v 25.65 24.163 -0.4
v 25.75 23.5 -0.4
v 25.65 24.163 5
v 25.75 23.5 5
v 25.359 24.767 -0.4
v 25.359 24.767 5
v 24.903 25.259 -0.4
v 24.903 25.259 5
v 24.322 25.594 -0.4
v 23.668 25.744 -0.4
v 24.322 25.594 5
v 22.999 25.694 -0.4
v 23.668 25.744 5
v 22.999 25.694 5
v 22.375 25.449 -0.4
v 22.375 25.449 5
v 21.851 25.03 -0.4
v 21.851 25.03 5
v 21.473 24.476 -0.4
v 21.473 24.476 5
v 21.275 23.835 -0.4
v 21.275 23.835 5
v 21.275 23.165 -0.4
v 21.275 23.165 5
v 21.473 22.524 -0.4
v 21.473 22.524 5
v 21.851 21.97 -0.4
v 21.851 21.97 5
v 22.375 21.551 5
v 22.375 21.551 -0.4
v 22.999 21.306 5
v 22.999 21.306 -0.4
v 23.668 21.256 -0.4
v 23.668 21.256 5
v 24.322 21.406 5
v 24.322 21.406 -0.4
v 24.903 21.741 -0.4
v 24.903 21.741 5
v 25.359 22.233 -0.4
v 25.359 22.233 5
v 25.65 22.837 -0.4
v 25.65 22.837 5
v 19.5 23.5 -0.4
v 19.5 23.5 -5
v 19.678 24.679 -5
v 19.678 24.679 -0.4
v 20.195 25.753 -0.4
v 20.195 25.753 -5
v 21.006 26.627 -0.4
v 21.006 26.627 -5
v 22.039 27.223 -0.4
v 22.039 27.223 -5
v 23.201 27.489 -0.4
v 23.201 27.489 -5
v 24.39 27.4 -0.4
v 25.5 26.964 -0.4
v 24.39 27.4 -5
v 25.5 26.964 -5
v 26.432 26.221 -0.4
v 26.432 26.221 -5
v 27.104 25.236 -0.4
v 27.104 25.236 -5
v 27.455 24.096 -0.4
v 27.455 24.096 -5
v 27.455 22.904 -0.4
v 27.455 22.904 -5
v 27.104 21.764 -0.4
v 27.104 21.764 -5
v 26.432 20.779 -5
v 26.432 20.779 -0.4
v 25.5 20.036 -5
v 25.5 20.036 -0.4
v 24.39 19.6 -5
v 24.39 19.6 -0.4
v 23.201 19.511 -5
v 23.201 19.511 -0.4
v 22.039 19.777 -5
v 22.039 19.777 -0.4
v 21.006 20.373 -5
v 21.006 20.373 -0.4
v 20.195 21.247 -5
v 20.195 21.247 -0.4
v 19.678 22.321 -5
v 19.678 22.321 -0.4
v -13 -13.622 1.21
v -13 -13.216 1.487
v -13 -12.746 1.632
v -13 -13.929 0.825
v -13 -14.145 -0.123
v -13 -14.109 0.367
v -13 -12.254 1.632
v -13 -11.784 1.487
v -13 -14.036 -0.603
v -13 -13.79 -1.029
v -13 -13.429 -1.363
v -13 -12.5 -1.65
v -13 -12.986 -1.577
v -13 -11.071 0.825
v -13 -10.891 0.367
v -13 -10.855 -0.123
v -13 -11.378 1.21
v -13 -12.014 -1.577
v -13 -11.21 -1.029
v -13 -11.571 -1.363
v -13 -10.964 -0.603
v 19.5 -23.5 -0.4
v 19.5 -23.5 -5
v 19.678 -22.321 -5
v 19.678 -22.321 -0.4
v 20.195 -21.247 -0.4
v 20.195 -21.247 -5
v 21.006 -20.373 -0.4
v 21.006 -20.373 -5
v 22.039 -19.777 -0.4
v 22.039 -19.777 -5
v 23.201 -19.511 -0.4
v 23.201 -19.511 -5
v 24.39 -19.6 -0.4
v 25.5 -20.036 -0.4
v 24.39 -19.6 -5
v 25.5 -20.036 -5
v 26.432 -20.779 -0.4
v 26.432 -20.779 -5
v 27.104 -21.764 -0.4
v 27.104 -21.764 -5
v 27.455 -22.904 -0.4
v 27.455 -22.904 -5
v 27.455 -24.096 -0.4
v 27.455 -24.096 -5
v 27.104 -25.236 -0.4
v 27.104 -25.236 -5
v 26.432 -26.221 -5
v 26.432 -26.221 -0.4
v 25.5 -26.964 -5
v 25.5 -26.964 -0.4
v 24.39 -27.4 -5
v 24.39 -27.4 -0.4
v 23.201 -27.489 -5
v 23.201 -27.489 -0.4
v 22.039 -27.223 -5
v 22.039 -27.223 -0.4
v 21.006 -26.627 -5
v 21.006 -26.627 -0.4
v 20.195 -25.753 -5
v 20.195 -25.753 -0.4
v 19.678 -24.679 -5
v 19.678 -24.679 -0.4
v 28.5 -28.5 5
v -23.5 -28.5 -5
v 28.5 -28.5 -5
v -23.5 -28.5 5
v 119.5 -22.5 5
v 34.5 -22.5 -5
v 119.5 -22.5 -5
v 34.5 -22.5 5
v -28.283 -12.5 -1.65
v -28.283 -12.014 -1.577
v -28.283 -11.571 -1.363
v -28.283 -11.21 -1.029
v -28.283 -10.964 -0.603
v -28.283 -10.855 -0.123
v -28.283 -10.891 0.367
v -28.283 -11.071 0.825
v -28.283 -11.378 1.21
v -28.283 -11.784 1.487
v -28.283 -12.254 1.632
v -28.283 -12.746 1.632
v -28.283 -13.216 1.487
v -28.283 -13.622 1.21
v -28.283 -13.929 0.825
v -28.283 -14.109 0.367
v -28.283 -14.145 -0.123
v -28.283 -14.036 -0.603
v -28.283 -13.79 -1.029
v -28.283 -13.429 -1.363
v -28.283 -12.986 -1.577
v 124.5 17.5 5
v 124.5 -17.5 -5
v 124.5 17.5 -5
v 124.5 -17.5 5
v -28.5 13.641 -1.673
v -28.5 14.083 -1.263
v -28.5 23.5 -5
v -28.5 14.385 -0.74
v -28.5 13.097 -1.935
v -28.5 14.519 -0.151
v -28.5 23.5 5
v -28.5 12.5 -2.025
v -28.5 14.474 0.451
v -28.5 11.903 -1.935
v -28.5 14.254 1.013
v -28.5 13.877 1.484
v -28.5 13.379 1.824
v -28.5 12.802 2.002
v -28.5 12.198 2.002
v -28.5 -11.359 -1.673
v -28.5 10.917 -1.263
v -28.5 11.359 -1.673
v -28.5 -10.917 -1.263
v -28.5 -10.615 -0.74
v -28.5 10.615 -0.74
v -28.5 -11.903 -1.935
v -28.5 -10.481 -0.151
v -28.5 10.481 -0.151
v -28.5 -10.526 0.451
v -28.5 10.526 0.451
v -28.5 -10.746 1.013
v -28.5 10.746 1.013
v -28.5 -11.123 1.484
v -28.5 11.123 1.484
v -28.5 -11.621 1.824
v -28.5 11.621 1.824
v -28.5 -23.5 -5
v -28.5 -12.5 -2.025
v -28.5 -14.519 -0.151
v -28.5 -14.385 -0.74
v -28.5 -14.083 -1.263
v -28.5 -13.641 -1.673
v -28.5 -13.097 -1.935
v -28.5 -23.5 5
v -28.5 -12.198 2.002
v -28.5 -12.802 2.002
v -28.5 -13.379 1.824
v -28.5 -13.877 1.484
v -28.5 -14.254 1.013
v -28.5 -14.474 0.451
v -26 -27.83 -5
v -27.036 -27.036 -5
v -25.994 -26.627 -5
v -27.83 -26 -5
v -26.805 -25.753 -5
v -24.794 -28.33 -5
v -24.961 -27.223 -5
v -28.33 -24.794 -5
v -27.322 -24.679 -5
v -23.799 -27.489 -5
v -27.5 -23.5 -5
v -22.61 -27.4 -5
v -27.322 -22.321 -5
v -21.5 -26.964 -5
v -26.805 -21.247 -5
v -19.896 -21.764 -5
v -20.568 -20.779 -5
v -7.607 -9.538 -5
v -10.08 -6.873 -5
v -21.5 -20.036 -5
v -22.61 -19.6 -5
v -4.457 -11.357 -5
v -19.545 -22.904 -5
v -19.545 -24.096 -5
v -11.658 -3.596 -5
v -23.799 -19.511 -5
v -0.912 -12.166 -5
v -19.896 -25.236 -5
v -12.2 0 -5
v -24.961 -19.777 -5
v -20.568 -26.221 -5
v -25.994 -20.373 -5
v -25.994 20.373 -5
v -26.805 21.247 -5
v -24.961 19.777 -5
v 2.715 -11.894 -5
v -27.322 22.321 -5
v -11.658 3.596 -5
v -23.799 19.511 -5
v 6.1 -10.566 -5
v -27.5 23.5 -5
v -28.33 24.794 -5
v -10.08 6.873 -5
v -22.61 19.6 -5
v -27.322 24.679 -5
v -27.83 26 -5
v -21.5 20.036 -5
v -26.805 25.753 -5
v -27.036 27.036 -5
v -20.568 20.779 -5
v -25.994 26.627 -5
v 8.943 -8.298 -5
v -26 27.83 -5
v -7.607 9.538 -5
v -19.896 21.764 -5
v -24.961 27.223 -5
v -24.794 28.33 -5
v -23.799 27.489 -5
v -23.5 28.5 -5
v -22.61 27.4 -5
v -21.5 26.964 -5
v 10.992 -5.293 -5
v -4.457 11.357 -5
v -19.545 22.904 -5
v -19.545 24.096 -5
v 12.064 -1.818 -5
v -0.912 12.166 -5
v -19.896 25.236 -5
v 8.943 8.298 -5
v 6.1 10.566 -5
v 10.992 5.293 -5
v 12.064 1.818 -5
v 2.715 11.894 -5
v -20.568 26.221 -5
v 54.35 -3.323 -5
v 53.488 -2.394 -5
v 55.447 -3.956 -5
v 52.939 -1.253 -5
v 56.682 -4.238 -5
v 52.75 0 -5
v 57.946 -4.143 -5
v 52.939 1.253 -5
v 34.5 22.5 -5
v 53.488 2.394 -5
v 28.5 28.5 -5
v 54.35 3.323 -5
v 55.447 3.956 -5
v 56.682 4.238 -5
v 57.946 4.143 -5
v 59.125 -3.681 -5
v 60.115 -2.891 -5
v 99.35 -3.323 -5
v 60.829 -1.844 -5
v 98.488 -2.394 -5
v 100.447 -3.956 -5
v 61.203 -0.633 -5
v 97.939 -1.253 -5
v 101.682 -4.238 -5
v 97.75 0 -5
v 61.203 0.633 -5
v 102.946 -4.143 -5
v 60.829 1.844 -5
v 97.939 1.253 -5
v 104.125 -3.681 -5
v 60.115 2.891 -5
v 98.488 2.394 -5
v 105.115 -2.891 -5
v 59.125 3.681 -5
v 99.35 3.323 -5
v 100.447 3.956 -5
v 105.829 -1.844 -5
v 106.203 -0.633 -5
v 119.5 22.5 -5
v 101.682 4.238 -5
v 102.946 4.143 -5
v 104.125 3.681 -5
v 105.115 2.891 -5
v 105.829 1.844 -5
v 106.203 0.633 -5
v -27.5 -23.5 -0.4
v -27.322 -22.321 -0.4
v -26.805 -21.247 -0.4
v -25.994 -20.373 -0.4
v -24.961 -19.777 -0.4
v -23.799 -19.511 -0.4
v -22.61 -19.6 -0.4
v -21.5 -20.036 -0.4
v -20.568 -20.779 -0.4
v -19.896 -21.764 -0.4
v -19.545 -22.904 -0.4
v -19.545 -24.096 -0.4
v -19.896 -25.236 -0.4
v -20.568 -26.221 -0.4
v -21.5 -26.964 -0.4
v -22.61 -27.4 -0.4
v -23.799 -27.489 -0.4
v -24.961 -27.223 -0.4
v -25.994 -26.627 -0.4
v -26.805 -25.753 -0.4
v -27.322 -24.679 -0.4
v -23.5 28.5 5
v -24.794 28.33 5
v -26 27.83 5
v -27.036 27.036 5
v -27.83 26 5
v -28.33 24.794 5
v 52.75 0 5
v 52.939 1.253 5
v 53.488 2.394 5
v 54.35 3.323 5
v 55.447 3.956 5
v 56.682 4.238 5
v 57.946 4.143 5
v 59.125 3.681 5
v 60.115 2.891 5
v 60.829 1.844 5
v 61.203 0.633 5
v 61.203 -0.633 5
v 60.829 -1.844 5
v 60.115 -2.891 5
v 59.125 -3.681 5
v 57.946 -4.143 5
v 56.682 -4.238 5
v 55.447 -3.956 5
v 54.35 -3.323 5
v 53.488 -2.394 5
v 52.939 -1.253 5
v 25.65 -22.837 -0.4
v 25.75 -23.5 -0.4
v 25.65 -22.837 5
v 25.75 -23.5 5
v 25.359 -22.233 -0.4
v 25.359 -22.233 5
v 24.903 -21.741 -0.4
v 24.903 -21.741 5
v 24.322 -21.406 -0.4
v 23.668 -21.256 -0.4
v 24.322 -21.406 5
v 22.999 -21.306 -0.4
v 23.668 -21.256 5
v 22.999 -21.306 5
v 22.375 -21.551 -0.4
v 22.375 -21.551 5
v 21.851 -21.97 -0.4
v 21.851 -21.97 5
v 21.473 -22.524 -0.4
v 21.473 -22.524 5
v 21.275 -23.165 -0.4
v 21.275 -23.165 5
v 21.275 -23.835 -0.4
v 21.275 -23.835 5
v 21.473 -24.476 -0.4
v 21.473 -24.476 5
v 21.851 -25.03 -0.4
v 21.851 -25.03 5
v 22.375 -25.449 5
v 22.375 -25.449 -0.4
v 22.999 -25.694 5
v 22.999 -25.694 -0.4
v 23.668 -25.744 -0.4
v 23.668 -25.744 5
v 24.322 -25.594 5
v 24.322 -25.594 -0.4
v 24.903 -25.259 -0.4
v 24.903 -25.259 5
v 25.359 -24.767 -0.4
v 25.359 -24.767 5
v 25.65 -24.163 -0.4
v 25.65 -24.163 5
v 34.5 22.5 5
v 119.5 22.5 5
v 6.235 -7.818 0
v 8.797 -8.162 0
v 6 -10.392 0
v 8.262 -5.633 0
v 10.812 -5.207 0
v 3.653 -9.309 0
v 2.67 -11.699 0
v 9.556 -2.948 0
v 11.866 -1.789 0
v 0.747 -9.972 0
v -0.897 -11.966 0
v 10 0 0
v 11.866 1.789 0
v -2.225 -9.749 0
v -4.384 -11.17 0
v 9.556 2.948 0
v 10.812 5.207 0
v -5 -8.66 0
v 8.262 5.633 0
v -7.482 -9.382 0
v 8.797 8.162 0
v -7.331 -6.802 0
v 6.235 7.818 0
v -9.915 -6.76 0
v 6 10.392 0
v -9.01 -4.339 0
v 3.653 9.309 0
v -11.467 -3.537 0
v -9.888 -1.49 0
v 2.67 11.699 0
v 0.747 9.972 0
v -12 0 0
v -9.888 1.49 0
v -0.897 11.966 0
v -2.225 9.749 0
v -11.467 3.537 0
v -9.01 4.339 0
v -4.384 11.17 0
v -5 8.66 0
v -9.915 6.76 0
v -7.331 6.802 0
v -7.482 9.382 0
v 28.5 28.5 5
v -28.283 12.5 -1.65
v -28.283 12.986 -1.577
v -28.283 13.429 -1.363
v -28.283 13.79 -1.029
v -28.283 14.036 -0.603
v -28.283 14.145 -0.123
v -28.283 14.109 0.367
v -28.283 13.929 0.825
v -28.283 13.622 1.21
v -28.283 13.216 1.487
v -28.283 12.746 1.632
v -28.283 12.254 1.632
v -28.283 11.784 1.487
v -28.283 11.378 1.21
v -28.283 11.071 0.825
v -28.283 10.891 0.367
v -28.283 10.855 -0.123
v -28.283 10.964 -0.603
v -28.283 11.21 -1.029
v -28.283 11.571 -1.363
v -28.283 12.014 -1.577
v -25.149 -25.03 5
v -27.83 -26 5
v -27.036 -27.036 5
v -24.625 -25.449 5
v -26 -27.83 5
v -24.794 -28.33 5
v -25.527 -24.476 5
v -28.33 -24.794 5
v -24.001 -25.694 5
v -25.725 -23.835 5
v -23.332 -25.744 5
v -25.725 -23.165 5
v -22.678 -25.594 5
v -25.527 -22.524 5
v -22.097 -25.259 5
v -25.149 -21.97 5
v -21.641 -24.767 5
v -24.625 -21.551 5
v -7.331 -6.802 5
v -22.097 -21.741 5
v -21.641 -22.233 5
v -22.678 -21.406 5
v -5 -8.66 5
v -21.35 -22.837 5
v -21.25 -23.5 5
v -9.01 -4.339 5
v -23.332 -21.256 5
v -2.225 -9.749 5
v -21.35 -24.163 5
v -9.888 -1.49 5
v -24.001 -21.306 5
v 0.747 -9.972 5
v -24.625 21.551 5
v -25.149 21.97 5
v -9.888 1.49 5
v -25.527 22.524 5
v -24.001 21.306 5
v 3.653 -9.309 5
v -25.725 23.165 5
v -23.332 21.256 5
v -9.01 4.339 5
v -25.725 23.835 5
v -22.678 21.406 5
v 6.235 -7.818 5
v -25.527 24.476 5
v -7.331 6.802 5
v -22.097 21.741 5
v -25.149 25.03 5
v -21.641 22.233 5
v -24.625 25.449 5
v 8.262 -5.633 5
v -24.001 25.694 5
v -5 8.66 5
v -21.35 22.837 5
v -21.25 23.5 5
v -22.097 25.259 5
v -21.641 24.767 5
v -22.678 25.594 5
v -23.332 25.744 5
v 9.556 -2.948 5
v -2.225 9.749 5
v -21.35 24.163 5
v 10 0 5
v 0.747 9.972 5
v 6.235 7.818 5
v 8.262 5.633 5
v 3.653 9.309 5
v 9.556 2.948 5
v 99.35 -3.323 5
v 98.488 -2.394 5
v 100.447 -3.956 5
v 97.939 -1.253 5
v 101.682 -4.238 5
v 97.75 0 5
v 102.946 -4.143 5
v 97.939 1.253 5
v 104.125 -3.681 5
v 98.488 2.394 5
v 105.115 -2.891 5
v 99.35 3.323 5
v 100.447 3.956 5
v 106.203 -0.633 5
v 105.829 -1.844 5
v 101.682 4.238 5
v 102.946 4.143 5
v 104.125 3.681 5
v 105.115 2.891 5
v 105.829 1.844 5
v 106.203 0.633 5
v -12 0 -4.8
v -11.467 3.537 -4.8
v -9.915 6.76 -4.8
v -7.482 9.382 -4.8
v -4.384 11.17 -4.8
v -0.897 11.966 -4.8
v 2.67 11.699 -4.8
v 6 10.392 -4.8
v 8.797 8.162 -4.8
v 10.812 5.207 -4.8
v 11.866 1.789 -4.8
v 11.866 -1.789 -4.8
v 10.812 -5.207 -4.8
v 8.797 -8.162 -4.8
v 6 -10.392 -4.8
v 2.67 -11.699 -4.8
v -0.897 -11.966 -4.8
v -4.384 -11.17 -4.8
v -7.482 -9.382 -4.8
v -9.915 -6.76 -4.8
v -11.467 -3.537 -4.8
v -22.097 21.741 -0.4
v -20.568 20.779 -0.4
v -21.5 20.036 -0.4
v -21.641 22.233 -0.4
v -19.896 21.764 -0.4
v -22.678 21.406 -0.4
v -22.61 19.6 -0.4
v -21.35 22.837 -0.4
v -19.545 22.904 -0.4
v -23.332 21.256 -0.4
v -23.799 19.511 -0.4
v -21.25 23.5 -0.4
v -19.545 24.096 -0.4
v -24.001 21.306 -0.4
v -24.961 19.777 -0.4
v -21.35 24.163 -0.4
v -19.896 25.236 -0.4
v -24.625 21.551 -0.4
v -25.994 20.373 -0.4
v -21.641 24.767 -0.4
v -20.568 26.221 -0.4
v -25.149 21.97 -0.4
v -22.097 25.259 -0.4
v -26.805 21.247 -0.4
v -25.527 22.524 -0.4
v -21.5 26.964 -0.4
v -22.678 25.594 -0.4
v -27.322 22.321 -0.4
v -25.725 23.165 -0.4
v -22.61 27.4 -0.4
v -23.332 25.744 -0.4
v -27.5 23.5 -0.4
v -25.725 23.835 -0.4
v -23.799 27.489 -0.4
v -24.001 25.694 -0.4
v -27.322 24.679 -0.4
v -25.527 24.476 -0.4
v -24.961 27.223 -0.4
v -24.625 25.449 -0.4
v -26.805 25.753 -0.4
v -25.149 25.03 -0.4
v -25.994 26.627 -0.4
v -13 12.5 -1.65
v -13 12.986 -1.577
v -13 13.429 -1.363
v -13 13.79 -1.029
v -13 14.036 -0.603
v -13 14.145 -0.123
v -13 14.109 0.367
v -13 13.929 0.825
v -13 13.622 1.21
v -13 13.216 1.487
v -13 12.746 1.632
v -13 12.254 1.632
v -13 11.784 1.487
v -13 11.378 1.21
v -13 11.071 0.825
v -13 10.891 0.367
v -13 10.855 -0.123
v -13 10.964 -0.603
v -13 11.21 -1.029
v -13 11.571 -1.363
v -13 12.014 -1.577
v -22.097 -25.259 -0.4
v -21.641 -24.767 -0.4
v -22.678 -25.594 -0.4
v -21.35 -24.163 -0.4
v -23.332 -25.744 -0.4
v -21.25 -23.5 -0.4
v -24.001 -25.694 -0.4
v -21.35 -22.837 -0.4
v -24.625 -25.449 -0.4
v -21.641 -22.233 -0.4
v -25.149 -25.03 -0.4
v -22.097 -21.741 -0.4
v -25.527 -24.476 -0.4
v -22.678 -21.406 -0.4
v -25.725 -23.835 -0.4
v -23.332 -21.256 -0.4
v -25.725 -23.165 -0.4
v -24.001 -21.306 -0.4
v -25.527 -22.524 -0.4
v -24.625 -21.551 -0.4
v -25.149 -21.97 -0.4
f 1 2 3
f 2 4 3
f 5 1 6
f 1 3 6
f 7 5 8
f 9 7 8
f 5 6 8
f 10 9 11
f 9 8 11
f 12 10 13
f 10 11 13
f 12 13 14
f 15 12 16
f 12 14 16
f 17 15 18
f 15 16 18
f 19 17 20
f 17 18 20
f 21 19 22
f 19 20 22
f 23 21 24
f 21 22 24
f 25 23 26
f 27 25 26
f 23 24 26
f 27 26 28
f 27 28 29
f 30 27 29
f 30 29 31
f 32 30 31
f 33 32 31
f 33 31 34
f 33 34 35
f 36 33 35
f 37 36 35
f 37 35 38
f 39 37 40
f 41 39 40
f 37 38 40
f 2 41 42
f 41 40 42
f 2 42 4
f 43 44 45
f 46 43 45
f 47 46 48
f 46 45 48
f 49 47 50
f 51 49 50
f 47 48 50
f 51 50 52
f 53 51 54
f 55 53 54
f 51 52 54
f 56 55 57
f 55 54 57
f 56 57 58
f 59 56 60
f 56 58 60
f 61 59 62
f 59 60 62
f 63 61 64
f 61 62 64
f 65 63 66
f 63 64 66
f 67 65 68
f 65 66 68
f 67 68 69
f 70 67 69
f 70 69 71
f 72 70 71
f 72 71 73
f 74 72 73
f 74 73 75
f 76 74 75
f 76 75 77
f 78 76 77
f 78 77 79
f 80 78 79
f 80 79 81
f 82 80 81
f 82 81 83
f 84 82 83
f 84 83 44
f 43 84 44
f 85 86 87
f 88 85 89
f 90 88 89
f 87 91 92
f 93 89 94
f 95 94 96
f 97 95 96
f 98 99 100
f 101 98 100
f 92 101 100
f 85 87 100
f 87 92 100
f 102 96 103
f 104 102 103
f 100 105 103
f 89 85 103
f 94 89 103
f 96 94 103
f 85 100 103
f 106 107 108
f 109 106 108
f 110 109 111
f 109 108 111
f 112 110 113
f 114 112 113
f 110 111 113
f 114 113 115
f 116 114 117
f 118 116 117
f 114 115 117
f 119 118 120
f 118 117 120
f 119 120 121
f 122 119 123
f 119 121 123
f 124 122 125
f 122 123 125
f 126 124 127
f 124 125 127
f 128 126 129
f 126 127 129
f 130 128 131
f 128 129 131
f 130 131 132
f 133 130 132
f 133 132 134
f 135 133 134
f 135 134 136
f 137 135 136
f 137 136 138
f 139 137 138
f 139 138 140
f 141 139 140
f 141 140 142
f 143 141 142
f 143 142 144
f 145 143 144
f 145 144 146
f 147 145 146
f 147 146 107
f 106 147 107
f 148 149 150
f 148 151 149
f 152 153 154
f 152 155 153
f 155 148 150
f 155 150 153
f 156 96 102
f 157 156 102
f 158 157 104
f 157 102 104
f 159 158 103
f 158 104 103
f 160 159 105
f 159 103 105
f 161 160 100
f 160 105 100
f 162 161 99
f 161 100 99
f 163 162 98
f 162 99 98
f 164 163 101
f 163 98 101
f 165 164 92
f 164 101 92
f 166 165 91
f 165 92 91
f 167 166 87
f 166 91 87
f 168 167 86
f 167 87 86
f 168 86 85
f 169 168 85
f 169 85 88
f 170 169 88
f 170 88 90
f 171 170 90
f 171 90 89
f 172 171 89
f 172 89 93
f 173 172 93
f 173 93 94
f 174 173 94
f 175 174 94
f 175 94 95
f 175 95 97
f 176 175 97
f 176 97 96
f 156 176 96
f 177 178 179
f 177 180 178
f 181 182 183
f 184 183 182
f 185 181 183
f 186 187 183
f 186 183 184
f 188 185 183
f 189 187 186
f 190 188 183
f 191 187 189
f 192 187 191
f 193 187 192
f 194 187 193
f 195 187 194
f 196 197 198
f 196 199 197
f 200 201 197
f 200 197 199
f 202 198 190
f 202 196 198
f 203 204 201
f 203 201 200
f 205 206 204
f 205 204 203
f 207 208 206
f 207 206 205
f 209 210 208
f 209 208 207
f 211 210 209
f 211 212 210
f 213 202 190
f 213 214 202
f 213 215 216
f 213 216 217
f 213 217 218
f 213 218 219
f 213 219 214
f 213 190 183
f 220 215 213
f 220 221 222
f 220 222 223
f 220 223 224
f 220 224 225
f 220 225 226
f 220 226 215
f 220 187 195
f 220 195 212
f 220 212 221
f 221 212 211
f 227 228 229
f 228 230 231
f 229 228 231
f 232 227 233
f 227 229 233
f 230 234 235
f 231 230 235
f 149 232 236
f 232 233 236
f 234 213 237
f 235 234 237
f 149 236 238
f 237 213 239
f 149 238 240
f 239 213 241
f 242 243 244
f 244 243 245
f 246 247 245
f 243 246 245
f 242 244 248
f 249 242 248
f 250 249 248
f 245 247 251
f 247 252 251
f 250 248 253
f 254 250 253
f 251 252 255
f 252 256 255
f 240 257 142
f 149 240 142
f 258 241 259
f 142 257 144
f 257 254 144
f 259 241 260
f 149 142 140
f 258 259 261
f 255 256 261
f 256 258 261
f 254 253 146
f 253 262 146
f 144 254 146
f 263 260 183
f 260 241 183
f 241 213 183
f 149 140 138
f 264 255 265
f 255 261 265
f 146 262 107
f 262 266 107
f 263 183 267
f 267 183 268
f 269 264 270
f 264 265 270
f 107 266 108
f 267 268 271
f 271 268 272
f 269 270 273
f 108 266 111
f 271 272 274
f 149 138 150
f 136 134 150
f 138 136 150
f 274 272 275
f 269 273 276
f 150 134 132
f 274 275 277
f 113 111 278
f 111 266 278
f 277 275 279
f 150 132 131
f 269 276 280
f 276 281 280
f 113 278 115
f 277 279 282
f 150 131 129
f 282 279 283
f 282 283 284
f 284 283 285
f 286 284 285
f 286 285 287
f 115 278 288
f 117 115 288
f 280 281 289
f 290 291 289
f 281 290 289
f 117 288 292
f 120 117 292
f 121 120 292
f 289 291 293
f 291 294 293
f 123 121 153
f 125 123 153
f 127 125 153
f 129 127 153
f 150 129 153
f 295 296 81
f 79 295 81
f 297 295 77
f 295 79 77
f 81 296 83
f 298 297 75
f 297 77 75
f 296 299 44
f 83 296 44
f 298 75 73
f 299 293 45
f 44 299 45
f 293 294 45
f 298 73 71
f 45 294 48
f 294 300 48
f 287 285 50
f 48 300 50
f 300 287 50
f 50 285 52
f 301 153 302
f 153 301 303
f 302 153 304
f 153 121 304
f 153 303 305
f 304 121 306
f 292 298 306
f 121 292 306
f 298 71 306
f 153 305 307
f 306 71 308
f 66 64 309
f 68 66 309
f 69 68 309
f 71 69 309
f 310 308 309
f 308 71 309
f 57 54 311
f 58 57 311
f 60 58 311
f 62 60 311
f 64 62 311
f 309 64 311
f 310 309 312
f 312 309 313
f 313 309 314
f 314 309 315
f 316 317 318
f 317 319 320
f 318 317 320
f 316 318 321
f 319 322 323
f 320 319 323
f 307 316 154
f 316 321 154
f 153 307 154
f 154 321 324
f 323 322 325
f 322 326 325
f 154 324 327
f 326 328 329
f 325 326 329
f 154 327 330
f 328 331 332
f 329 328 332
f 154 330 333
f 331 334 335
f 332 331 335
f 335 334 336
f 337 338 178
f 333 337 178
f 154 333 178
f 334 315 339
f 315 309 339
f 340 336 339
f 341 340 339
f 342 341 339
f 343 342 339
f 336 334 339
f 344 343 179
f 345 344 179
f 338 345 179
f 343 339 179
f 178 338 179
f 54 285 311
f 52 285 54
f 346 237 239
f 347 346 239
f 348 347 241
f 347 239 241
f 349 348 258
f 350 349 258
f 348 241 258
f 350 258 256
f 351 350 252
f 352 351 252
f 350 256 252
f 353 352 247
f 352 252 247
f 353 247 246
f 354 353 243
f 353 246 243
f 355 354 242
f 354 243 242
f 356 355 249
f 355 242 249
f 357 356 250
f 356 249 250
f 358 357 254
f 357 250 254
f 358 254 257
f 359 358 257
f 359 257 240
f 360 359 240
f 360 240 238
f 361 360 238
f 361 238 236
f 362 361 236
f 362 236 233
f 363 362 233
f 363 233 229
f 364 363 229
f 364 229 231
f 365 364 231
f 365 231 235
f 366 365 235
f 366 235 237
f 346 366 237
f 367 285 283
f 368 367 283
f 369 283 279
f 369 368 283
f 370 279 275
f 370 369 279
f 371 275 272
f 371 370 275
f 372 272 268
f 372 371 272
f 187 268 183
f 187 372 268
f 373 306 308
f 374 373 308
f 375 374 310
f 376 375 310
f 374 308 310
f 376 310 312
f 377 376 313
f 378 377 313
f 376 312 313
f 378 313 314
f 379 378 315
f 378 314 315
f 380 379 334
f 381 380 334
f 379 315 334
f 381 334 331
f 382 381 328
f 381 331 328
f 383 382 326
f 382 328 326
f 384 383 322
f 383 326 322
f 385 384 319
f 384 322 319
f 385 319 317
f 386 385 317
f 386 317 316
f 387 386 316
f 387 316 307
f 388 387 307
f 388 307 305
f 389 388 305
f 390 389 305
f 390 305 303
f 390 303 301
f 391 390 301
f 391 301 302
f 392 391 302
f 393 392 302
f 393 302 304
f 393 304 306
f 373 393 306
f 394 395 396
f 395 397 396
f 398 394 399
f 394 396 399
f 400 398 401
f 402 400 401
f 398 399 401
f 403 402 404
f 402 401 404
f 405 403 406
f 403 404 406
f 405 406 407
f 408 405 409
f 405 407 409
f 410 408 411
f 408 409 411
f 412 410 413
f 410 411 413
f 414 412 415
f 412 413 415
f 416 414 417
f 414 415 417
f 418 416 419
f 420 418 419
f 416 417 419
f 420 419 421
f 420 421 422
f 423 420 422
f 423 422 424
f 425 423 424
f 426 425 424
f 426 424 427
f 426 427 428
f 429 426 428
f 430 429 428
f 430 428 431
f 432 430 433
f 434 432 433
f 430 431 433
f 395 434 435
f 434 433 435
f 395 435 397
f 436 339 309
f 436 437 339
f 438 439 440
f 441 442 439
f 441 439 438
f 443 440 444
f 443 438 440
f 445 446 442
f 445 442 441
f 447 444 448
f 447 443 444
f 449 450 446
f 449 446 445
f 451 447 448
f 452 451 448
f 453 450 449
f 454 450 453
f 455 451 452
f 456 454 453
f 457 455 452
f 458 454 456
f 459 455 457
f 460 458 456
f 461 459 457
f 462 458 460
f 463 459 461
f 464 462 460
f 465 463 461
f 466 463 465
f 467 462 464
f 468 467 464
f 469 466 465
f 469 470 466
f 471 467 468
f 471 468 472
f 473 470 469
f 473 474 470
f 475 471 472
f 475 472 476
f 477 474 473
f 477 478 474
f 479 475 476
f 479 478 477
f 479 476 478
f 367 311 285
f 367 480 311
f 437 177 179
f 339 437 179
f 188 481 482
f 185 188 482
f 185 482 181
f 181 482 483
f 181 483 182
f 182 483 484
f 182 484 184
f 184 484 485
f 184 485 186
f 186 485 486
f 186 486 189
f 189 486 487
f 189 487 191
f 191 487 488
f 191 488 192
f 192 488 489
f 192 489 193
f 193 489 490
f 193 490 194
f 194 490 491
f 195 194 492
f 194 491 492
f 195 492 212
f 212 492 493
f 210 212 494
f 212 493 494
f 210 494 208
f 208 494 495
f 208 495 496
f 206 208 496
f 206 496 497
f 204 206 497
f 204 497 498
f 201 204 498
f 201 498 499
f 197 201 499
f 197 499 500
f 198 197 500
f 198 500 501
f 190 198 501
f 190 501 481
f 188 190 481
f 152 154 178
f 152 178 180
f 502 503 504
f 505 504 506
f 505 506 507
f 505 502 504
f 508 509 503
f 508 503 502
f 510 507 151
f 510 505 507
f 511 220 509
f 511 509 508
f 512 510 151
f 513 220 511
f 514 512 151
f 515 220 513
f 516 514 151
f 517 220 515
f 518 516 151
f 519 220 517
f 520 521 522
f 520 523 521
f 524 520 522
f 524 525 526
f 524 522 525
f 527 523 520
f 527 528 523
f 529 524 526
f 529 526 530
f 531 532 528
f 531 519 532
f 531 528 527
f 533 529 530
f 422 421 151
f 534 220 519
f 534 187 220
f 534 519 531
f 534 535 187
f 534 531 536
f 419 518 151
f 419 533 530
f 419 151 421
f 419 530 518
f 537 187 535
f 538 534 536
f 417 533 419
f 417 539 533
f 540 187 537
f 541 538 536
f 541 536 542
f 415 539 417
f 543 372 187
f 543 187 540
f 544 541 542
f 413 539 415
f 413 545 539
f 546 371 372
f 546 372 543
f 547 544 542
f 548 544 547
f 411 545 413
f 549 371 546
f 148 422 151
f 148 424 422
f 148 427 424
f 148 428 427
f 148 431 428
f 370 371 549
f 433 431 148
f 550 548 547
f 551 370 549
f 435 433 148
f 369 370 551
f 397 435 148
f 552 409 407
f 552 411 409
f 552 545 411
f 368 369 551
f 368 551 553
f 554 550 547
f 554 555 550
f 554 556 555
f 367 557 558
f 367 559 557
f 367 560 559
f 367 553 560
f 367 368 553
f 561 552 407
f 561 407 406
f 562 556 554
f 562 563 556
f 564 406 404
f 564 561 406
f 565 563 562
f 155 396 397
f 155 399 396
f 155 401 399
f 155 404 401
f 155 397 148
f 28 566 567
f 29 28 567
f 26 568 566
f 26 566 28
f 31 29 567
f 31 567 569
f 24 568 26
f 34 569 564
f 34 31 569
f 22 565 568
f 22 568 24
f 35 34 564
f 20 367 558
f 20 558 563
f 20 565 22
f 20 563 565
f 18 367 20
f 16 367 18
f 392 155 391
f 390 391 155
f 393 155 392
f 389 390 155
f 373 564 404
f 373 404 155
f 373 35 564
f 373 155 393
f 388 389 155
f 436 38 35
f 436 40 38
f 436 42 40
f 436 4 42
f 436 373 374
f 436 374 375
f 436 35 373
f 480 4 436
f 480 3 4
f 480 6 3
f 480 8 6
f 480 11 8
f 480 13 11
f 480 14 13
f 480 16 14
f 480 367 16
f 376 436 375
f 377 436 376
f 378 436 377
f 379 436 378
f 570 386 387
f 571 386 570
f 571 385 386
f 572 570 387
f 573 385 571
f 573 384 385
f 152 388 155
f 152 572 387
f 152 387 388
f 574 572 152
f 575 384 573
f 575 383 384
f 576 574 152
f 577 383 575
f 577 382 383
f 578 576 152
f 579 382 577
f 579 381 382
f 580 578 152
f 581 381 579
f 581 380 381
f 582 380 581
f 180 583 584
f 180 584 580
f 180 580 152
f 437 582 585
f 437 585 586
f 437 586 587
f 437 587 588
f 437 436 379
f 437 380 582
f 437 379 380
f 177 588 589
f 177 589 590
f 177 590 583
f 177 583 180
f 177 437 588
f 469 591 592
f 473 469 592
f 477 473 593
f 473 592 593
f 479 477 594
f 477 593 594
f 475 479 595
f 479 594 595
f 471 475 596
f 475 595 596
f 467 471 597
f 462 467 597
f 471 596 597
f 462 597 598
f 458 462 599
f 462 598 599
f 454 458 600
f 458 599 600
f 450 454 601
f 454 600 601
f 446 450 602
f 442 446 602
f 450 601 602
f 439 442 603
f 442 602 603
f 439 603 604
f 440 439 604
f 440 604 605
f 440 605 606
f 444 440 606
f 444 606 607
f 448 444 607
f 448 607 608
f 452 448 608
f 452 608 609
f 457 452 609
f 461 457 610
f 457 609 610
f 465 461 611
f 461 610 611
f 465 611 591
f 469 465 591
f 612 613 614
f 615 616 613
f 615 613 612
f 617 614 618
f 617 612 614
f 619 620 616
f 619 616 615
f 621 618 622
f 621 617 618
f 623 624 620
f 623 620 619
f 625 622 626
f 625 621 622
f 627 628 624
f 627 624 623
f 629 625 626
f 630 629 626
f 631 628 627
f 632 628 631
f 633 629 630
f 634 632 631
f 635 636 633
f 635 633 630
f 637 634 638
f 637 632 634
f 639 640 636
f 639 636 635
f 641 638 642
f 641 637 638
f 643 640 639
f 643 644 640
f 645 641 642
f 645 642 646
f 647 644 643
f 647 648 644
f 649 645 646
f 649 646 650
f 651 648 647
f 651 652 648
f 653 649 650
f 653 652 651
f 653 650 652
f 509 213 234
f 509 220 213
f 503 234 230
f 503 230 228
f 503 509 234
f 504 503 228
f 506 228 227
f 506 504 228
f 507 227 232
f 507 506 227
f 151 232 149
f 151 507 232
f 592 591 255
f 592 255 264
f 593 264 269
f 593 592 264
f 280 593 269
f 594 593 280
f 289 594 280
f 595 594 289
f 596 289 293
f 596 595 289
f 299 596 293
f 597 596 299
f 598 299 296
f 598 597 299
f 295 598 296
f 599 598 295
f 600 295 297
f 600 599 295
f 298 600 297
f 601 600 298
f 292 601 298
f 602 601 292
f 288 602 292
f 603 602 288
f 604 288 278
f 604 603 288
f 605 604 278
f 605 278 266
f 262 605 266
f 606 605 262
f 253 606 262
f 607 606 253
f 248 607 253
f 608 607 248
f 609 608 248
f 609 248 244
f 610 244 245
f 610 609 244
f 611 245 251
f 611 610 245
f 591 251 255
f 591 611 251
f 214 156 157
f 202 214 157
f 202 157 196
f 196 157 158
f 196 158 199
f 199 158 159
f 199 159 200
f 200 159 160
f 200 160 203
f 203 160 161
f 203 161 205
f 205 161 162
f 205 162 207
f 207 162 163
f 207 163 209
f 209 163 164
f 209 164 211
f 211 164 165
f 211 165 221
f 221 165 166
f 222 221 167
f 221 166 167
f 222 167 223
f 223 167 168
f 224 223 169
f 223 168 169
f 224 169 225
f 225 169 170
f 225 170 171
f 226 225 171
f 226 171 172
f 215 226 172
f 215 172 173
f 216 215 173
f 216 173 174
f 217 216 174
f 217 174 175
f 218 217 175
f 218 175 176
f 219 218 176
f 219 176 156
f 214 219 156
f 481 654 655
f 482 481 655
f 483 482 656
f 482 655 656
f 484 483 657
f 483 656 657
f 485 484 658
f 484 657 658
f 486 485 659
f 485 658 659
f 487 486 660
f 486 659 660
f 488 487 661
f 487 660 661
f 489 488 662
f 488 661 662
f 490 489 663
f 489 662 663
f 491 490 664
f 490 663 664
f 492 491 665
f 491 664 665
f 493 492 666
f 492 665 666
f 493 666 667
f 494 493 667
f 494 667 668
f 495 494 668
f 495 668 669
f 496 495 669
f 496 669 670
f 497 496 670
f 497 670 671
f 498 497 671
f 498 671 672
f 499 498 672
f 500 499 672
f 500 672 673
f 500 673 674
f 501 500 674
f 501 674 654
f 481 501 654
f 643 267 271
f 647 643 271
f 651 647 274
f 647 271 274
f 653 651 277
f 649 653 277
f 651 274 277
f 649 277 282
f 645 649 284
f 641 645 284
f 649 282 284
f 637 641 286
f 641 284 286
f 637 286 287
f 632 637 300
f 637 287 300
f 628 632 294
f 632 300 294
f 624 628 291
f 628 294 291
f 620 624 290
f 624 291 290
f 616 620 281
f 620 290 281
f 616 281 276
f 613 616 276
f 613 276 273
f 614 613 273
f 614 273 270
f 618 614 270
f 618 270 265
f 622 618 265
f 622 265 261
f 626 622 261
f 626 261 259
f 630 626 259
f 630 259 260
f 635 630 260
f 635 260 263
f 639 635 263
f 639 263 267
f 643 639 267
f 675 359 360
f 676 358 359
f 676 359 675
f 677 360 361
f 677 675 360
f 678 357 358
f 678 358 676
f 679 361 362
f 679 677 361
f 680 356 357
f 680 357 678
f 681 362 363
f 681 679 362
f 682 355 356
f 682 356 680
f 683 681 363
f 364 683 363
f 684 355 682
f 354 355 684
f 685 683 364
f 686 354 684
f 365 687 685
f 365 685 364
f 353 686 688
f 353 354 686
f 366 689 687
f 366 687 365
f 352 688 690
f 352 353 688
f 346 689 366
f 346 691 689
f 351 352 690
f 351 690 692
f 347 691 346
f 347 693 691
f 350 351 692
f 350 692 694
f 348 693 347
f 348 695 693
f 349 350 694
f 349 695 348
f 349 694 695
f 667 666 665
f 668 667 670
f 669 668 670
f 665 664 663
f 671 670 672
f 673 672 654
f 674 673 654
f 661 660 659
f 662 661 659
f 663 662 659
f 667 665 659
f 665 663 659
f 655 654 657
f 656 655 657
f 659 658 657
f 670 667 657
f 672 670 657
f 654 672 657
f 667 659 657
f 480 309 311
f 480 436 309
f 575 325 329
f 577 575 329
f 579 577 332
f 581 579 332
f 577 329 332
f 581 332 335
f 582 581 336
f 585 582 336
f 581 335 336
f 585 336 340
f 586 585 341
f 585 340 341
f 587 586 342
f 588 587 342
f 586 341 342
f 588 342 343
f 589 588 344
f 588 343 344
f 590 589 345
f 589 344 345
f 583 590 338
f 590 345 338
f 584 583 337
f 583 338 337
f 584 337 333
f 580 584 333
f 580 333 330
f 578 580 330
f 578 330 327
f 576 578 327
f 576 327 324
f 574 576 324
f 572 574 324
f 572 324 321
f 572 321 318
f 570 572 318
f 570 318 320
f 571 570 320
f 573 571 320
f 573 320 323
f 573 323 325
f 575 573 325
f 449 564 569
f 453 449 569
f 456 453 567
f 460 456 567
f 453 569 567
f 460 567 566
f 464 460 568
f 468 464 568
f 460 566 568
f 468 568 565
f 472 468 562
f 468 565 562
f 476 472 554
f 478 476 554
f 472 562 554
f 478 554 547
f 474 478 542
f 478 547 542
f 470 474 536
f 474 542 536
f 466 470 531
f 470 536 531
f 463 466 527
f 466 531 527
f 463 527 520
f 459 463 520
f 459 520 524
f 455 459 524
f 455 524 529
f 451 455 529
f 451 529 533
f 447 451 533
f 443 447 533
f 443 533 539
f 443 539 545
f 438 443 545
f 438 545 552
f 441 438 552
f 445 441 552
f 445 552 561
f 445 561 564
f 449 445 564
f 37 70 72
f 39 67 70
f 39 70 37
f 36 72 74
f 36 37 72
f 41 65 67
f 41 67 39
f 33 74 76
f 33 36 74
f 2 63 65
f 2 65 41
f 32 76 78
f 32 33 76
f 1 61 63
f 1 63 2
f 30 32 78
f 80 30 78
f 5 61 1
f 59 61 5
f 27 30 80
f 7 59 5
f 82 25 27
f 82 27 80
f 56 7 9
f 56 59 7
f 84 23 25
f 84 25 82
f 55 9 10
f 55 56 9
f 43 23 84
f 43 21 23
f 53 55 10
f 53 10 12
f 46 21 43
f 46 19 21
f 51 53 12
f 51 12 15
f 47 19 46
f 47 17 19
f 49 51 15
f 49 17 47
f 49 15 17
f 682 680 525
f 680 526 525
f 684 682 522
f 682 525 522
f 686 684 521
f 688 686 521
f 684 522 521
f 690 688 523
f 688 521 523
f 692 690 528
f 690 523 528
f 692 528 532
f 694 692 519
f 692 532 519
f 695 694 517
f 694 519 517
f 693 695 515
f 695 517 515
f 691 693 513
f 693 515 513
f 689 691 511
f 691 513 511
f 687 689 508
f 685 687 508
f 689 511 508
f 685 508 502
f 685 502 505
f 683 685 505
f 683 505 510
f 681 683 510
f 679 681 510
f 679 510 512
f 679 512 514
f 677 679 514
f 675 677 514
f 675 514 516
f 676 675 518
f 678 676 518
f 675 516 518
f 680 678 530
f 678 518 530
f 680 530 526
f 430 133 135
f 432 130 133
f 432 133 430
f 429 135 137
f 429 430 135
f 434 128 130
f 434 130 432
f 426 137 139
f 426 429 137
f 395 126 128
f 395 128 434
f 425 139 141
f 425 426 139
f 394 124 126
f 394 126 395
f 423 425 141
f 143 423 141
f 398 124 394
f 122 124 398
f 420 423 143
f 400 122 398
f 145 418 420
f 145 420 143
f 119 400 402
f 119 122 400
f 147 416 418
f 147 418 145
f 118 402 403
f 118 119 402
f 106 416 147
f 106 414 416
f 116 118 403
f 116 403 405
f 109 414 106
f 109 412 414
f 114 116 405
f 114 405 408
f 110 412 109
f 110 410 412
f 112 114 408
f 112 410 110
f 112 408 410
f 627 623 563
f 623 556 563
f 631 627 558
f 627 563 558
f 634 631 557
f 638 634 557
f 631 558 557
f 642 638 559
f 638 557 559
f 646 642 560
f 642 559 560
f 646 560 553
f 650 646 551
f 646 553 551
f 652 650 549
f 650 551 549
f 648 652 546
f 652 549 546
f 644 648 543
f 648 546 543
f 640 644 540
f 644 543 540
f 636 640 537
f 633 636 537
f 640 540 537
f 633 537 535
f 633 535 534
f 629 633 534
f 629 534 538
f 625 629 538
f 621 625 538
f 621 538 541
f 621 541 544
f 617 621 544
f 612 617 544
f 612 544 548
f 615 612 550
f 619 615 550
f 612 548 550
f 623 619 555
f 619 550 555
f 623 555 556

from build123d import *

# Parameters (mm, degrees)
EXTRUDE_1_DEPTH              = 5
SKETCH_6_R                   = 10
CUT_EXTRUDE_1513_DEPTH       = 10
SKETCH_19_R                  = 12
CUT_EXTRUDE_1929_DEPTH       = 5
HOLE_WIZARD_8_5_8_5_1_D      = 8.5
HOLE_WIZARD_1_D              = 4.5
HOLE_WIZARD_1_CBORE_D        = 8
HOLE_WIZARD_1_CBORE_DEPTH    = 4.6
FILLET_1_R                   = 5
CHAMFER_1_SIZE               = 5
CHAMFER_2_SIZE               = 0.2
HOLE_WIZARD_M4_1_D           = 3.3
HOLE_WIZARD_M4_1_DEPTH       = 15.5
HOLE_WIZARD_M4_1_CSINK_D     = 4.05
HOLE_WIZARD_M4_1_CSINK_ANGLE = 120


with BuildPart() as part:
    # 草图1 → 凸台-拉伸1 (new body, symmetric)
    with BuildSketch(Plane.XY):
        Polygon((28.5, 28.5), (-28.5, 28.5), (-28.5, -28.5), (28.5, -28.5), (34.5, -22.5), (124.5, -22.5), (124.5, 22.5), (34.5, 22.5), align=None)
    extrude(amount=EXTRUDE_1_DEPTH, both=True)

    # 草图6 → Cut-Extrude 1513 (cut)
    with BuildSketch(Plane.XY.offset(5)):
        Circle(SKETCH_6_R)
    extrude(amount=-CUT_EXTRUDE_1513_DEPTH, mode=Mode.SUBTRACT)

    # 草图19 → Cut-Extrude 1929 (cut)
    with BuildSketch(Plane(origin=(0, 0, -5), x_dir=(-1, 0, 0), z_dir=(0, 0, -1))):
        Circle(SKETCH_19_R)
    extrude(amount=-CUT_EXTRUDE_1929_DEPTH, mode=Mode.SUBTRACT)

    # Ø8.5 (8.5) 直径孔1 (through all)
    with Locations(Plane.XY.offset(5)):
        with Locations((57, 0), (102, 0)):
            Hole(HOLE_WIZARD_8_5_8_5_1_D / 2)

    # 打孔尺寸(%根据)内六角圆柱头螺钉的类型1 (through all)
    with Locations(Plane(origin=(0, 0, -5), x_dir=(-1, 0, 0), z_dir=(0, 0, -1))):
        with Locations((-23.5, 23.5), (23.5, 23.5), (23.5, -23.5), (-23.5, -23.5)):
            CounterBoreHole(HOLE_WIZARD_1_D / 2, HOLE_WIZARD_1_CBORE_D / 2, HOLE_WIZARD_1_CBORE_DEPTH)

    # 圆角1
    fillet_1_edges = [part.edges().sort_by_distance(p)[0] for p in [
        (-28.5, -28.5, 0),
        (-28.5, 28.5, 0),
    ]]
    fillet(fillet_1_edges, radius=FILLET_1_R)

    # 倒角1
    chamfer_1_edges = [part.edges().sort_by_distance(p)[0] for p in [
        (124.5, 22.5, 0),
        (124.5, -22.5, 0),
    ]]
    chamfer(chamfer_1_edges, length=CHAMFER_1_SIZE)

    # 倒角2
    chamfer_2_edges = [part.edges().sort_by_distance(p)[0] for p in [
        (12, 0, -5),
    ]]
    chamfer(chamfer_2_edges, length=CHAMFER_2_SIZE)

    # M4 螺纹孔1
    with Locations(Plane.ZY.offset(28.5)):
        with Locations((0, 12.5), (0, -12.5)):
            CounterSinkHole(HOLE_WIZARD_M4_1_D / 2, HOLE_WIZARD_M4_1_CSINK_D / 2, depth=HOLE_WIZARD_M4_1_DEPTH, counter_sink_angle=HOLE_WIZARD_M4_1_CSINK_ANGLE)


solid = part.part
